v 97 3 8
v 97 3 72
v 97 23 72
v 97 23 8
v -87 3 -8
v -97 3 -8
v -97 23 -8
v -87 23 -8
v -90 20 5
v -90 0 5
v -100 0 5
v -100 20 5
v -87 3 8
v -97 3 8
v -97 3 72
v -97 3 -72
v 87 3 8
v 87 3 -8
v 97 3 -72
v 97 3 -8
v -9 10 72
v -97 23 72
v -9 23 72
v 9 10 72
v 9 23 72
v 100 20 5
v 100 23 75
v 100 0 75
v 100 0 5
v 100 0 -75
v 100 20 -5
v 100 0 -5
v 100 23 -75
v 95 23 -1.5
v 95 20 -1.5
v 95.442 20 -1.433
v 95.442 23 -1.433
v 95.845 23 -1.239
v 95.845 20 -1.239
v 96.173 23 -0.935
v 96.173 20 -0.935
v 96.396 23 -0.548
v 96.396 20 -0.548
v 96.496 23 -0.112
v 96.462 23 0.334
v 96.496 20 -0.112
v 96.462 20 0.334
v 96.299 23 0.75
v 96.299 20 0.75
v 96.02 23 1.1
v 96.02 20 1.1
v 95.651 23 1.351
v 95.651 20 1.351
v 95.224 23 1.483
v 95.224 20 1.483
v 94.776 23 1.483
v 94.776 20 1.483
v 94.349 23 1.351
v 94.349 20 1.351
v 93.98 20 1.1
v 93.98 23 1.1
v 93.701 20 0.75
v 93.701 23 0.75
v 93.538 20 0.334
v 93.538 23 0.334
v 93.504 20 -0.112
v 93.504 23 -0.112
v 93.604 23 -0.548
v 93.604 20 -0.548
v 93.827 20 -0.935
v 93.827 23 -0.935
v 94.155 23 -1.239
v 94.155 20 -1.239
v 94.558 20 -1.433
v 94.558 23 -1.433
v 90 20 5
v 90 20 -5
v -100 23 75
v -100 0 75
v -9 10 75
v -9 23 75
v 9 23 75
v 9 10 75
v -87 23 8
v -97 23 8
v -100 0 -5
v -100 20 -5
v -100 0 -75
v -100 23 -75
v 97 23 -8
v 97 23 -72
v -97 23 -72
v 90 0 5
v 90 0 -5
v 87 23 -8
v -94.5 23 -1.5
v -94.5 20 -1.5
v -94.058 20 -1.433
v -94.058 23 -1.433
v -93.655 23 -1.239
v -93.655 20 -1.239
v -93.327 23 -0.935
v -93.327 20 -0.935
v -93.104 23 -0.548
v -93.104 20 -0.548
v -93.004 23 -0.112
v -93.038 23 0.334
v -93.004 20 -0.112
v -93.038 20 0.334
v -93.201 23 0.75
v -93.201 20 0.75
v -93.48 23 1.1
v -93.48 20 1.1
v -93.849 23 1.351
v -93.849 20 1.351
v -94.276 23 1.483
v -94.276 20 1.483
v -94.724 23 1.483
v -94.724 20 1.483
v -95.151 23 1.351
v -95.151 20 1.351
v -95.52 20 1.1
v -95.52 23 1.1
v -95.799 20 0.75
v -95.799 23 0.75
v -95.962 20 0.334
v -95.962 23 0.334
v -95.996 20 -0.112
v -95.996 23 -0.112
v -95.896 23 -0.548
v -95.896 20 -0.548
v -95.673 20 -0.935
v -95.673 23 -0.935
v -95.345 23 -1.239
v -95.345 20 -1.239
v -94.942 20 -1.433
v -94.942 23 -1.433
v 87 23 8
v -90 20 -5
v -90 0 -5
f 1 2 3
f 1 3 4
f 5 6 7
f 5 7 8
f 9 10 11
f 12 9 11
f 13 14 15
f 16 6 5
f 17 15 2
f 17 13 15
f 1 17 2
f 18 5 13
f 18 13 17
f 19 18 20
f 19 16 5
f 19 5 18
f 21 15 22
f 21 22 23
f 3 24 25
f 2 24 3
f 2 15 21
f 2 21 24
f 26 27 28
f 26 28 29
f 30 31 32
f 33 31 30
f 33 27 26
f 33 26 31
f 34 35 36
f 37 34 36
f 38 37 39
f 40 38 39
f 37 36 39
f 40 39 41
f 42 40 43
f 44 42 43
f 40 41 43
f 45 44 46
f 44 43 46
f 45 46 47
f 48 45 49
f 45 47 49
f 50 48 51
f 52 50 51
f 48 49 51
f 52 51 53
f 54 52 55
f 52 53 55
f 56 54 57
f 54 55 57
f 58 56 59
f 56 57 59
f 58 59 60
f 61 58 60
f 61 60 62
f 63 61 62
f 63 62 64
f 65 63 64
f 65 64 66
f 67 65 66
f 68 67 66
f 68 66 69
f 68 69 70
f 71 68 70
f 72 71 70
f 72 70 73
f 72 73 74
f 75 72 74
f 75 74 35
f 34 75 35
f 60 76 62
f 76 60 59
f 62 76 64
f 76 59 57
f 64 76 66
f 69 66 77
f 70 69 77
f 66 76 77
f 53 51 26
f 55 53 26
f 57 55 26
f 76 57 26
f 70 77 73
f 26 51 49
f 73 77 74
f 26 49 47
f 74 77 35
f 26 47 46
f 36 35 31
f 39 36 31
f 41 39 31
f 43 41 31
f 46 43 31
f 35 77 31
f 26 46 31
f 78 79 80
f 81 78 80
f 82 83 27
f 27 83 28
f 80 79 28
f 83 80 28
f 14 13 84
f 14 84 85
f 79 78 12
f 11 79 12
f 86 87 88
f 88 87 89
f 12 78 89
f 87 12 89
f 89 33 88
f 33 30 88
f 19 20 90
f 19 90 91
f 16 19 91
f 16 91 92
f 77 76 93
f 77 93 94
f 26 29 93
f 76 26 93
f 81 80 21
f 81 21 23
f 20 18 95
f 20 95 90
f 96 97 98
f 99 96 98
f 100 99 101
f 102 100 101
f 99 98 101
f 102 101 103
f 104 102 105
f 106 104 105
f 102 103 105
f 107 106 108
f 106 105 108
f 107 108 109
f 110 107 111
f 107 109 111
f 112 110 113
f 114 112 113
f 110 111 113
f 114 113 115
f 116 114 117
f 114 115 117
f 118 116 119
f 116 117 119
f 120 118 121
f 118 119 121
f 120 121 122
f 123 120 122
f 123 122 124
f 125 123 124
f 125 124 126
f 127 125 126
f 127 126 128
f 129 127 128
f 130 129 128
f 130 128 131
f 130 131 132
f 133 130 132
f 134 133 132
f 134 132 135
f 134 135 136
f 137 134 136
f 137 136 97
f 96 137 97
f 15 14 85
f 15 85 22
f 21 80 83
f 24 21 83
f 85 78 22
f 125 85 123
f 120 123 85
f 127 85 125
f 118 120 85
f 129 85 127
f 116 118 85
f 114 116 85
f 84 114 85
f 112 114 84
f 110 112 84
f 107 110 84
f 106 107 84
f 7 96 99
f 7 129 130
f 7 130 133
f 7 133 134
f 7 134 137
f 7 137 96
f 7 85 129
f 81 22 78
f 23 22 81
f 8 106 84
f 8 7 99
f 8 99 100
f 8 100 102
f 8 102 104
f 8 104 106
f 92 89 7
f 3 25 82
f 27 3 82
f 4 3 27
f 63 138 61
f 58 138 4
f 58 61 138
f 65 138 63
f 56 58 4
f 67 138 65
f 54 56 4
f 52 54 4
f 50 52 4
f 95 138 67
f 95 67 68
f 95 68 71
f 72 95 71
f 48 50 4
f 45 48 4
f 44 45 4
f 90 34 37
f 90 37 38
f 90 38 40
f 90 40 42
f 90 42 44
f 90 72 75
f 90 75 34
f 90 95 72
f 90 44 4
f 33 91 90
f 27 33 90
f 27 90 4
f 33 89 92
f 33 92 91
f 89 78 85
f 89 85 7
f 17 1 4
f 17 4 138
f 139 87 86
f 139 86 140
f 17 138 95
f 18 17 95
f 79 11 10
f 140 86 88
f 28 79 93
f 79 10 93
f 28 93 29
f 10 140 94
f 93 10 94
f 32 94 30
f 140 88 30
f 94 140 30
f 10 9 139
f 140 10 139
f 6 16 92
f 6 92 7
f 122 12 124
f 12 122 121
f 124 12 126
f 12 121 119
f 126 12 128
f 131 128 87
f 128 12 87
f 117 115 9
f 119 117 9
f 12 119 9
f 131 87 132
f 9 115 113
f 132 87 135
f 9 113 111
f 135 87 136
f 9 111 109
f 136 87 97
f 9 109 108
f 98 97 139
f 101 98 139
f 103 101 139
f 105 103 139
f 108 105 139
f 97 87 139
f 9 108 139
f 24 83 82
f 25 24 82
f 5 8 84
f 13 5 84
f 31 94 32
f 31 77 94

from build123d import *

# Parameters (mm, degrees)
SKETCH1_W           = 200
SKETCH1_H           = 150
BOSS_EXTRUDE1_DEPTH = 3
BOSS_EXTRUDE2_DEPTH = 20
SKETCH3_W           = 10
SKETCH3_H           = 10
BOSS_EXTRUDE3_DEPTH = 3
SKETCH4_W           = 10
SKETCH4_H           = 10
CUT_EXTRUDE1_DEPTH  = 127.589889012
SKETCH5_W           = 10
SKETCH5_H           = 10
BOSS_EXTRUDE4_DEPTH = 3
SKETCH6_W           = 10
SKETCH6_H           = 10
CUT_EXTRUDE2_DEPTH  = 3
SKETCH7_R           = 1.5
CUT_EXTRUDE3_DEPTH  = 127.589889012
SKETCH8_R           = 1.5
CUT_EXTRUDE4_DEPTH  = 127.589889012
SKETCH10_W          = 18
SKETCH10_H          = 13
CUT_EXTRUDE5_DEPTH  = 3


with BuildPart() as part:
    # Sketch1 → Boss-Extrude1 (new body)
    with BuildSketch(Plane(origin=(0, 0, 0), x_dir=(1, 0, 0), z_dir=(0, 1, 0))):
        Rectangle(SKETCH1_W, SKETCH1_H)
    extrude(amount=BOSS_EXTRUDE1_DEPTH)

    # Sketch2 → Boss-Extrude2 (add)
    with BuildSketch(Plane(origin=(0, 3, 0), x_dir=(1, 0, 0), z_dir=(0, 1, 0))):
        Polygon((100, -5), (90, -5), (90, 5), (100, 5), (100, 75), (-100, 75), (-100, 5), (-90, 5), (-90, -5), (-100, -5), (-100, -75), (100, -75), align=None)
        Polygon((97, -8), (87, -8), (87, 8), (97, 8), (97, 72), (-97, 72), (-97, 8), (-87, 8), (-87, -8), (-97, -8), (-97, -72), (97, -72), align=None, mode=Mode.SUBTRACT)
    extrude(amount=BOSS_EXTRUDE2_DEPTH)

    # Sketch3 → Boss-Extrude3 (add)
    with BuildSketch(Plane(origin=(0, 23, 0), x_dir=(1, 0, 0), z_dir=(0, 1, 0))):
        with Locations((-95, 0)):
            Rectangle(SKETCH3_W, SKETCH3_H)
    extrude(amount=-BOSS_EXTRUDE3_DEPTH)

    # Sketch4 → Cut-Extrude1 (cut, through all)
    with BuildSketch(Plane(origin=(0, 3, 0), x_dir=(1, 0, 0), z_dir=(0, 1, 0))):
        with Locations((-95, 0)):
            Rectangle(SKETCH4_W, SKETCH4_H)
    extrude(amount=-CUT_EXTRUDE1_DEPTH, mode=Mode.SUBTRACT)

    # Sketch5 → Boss-Extrude4 (add)
    with BuildSketch(Plane(origin=(0, 23, 0), x_dir=(1, 0, 0), z_dir=(0, 1, 0))):
        with Locations((95, 0)):
            Rectangle(SKETCH5_W, SKETCH5_H)
    extrude(amount=-BOSS_EXTRUDE4_DEPTH)

    # Sketch6 → Cut-Extrude2 (cut)
    with BuildSketch(Plane(origin=(0, 3, 0), x_dir=(1, 0, 0), z_dir=(0, 1, 0))):
        with Locations((95, 0)):
            Rectangle(SKETCH6_W, SKETCH6_H)
    extrude(amount=-CUT_EXTRUDE2_DEPTH, mode=Mode.SUBTRACT)

    # Sketch7 → Cut-Extrude3 (cut, through all)
    with BuildSketch(Plane.XZ.offset(-20)):
        with Locations(Location((95, 0, 0), (0, 0, 270))):
            Circle(SKETCH7_R)
    extrude(amount=-CUT_EXTRUDE3_DEPTH, mode=Mode.SUBTRACT)

    # Sketch8 → Cut-Extrude4 (cut, through all)
    with BuildSketch(Plane.XZ.offset(-20)):
        with Locations(Location((-94.5, 0, 0), (0, 0, 270))):
            Circle(SKETCH8_R)
    extrude(amount=-CUT_EXTRUDE4_DEPTH, mode=Mode.SUBTRACT)

    # Sketch10 → Cut-Extrude5 (cut)
    with BuildSketch(Plane.XY.offset(75)):
        with Locations((0, 16.5)):
            Rectangle(SKETCH10_W, SKETCH10_H)
    extrude(amount=-CUT_EXTRUDE5_DEPTH, mode=Mode.SUBTRACT)


solid = part.part
